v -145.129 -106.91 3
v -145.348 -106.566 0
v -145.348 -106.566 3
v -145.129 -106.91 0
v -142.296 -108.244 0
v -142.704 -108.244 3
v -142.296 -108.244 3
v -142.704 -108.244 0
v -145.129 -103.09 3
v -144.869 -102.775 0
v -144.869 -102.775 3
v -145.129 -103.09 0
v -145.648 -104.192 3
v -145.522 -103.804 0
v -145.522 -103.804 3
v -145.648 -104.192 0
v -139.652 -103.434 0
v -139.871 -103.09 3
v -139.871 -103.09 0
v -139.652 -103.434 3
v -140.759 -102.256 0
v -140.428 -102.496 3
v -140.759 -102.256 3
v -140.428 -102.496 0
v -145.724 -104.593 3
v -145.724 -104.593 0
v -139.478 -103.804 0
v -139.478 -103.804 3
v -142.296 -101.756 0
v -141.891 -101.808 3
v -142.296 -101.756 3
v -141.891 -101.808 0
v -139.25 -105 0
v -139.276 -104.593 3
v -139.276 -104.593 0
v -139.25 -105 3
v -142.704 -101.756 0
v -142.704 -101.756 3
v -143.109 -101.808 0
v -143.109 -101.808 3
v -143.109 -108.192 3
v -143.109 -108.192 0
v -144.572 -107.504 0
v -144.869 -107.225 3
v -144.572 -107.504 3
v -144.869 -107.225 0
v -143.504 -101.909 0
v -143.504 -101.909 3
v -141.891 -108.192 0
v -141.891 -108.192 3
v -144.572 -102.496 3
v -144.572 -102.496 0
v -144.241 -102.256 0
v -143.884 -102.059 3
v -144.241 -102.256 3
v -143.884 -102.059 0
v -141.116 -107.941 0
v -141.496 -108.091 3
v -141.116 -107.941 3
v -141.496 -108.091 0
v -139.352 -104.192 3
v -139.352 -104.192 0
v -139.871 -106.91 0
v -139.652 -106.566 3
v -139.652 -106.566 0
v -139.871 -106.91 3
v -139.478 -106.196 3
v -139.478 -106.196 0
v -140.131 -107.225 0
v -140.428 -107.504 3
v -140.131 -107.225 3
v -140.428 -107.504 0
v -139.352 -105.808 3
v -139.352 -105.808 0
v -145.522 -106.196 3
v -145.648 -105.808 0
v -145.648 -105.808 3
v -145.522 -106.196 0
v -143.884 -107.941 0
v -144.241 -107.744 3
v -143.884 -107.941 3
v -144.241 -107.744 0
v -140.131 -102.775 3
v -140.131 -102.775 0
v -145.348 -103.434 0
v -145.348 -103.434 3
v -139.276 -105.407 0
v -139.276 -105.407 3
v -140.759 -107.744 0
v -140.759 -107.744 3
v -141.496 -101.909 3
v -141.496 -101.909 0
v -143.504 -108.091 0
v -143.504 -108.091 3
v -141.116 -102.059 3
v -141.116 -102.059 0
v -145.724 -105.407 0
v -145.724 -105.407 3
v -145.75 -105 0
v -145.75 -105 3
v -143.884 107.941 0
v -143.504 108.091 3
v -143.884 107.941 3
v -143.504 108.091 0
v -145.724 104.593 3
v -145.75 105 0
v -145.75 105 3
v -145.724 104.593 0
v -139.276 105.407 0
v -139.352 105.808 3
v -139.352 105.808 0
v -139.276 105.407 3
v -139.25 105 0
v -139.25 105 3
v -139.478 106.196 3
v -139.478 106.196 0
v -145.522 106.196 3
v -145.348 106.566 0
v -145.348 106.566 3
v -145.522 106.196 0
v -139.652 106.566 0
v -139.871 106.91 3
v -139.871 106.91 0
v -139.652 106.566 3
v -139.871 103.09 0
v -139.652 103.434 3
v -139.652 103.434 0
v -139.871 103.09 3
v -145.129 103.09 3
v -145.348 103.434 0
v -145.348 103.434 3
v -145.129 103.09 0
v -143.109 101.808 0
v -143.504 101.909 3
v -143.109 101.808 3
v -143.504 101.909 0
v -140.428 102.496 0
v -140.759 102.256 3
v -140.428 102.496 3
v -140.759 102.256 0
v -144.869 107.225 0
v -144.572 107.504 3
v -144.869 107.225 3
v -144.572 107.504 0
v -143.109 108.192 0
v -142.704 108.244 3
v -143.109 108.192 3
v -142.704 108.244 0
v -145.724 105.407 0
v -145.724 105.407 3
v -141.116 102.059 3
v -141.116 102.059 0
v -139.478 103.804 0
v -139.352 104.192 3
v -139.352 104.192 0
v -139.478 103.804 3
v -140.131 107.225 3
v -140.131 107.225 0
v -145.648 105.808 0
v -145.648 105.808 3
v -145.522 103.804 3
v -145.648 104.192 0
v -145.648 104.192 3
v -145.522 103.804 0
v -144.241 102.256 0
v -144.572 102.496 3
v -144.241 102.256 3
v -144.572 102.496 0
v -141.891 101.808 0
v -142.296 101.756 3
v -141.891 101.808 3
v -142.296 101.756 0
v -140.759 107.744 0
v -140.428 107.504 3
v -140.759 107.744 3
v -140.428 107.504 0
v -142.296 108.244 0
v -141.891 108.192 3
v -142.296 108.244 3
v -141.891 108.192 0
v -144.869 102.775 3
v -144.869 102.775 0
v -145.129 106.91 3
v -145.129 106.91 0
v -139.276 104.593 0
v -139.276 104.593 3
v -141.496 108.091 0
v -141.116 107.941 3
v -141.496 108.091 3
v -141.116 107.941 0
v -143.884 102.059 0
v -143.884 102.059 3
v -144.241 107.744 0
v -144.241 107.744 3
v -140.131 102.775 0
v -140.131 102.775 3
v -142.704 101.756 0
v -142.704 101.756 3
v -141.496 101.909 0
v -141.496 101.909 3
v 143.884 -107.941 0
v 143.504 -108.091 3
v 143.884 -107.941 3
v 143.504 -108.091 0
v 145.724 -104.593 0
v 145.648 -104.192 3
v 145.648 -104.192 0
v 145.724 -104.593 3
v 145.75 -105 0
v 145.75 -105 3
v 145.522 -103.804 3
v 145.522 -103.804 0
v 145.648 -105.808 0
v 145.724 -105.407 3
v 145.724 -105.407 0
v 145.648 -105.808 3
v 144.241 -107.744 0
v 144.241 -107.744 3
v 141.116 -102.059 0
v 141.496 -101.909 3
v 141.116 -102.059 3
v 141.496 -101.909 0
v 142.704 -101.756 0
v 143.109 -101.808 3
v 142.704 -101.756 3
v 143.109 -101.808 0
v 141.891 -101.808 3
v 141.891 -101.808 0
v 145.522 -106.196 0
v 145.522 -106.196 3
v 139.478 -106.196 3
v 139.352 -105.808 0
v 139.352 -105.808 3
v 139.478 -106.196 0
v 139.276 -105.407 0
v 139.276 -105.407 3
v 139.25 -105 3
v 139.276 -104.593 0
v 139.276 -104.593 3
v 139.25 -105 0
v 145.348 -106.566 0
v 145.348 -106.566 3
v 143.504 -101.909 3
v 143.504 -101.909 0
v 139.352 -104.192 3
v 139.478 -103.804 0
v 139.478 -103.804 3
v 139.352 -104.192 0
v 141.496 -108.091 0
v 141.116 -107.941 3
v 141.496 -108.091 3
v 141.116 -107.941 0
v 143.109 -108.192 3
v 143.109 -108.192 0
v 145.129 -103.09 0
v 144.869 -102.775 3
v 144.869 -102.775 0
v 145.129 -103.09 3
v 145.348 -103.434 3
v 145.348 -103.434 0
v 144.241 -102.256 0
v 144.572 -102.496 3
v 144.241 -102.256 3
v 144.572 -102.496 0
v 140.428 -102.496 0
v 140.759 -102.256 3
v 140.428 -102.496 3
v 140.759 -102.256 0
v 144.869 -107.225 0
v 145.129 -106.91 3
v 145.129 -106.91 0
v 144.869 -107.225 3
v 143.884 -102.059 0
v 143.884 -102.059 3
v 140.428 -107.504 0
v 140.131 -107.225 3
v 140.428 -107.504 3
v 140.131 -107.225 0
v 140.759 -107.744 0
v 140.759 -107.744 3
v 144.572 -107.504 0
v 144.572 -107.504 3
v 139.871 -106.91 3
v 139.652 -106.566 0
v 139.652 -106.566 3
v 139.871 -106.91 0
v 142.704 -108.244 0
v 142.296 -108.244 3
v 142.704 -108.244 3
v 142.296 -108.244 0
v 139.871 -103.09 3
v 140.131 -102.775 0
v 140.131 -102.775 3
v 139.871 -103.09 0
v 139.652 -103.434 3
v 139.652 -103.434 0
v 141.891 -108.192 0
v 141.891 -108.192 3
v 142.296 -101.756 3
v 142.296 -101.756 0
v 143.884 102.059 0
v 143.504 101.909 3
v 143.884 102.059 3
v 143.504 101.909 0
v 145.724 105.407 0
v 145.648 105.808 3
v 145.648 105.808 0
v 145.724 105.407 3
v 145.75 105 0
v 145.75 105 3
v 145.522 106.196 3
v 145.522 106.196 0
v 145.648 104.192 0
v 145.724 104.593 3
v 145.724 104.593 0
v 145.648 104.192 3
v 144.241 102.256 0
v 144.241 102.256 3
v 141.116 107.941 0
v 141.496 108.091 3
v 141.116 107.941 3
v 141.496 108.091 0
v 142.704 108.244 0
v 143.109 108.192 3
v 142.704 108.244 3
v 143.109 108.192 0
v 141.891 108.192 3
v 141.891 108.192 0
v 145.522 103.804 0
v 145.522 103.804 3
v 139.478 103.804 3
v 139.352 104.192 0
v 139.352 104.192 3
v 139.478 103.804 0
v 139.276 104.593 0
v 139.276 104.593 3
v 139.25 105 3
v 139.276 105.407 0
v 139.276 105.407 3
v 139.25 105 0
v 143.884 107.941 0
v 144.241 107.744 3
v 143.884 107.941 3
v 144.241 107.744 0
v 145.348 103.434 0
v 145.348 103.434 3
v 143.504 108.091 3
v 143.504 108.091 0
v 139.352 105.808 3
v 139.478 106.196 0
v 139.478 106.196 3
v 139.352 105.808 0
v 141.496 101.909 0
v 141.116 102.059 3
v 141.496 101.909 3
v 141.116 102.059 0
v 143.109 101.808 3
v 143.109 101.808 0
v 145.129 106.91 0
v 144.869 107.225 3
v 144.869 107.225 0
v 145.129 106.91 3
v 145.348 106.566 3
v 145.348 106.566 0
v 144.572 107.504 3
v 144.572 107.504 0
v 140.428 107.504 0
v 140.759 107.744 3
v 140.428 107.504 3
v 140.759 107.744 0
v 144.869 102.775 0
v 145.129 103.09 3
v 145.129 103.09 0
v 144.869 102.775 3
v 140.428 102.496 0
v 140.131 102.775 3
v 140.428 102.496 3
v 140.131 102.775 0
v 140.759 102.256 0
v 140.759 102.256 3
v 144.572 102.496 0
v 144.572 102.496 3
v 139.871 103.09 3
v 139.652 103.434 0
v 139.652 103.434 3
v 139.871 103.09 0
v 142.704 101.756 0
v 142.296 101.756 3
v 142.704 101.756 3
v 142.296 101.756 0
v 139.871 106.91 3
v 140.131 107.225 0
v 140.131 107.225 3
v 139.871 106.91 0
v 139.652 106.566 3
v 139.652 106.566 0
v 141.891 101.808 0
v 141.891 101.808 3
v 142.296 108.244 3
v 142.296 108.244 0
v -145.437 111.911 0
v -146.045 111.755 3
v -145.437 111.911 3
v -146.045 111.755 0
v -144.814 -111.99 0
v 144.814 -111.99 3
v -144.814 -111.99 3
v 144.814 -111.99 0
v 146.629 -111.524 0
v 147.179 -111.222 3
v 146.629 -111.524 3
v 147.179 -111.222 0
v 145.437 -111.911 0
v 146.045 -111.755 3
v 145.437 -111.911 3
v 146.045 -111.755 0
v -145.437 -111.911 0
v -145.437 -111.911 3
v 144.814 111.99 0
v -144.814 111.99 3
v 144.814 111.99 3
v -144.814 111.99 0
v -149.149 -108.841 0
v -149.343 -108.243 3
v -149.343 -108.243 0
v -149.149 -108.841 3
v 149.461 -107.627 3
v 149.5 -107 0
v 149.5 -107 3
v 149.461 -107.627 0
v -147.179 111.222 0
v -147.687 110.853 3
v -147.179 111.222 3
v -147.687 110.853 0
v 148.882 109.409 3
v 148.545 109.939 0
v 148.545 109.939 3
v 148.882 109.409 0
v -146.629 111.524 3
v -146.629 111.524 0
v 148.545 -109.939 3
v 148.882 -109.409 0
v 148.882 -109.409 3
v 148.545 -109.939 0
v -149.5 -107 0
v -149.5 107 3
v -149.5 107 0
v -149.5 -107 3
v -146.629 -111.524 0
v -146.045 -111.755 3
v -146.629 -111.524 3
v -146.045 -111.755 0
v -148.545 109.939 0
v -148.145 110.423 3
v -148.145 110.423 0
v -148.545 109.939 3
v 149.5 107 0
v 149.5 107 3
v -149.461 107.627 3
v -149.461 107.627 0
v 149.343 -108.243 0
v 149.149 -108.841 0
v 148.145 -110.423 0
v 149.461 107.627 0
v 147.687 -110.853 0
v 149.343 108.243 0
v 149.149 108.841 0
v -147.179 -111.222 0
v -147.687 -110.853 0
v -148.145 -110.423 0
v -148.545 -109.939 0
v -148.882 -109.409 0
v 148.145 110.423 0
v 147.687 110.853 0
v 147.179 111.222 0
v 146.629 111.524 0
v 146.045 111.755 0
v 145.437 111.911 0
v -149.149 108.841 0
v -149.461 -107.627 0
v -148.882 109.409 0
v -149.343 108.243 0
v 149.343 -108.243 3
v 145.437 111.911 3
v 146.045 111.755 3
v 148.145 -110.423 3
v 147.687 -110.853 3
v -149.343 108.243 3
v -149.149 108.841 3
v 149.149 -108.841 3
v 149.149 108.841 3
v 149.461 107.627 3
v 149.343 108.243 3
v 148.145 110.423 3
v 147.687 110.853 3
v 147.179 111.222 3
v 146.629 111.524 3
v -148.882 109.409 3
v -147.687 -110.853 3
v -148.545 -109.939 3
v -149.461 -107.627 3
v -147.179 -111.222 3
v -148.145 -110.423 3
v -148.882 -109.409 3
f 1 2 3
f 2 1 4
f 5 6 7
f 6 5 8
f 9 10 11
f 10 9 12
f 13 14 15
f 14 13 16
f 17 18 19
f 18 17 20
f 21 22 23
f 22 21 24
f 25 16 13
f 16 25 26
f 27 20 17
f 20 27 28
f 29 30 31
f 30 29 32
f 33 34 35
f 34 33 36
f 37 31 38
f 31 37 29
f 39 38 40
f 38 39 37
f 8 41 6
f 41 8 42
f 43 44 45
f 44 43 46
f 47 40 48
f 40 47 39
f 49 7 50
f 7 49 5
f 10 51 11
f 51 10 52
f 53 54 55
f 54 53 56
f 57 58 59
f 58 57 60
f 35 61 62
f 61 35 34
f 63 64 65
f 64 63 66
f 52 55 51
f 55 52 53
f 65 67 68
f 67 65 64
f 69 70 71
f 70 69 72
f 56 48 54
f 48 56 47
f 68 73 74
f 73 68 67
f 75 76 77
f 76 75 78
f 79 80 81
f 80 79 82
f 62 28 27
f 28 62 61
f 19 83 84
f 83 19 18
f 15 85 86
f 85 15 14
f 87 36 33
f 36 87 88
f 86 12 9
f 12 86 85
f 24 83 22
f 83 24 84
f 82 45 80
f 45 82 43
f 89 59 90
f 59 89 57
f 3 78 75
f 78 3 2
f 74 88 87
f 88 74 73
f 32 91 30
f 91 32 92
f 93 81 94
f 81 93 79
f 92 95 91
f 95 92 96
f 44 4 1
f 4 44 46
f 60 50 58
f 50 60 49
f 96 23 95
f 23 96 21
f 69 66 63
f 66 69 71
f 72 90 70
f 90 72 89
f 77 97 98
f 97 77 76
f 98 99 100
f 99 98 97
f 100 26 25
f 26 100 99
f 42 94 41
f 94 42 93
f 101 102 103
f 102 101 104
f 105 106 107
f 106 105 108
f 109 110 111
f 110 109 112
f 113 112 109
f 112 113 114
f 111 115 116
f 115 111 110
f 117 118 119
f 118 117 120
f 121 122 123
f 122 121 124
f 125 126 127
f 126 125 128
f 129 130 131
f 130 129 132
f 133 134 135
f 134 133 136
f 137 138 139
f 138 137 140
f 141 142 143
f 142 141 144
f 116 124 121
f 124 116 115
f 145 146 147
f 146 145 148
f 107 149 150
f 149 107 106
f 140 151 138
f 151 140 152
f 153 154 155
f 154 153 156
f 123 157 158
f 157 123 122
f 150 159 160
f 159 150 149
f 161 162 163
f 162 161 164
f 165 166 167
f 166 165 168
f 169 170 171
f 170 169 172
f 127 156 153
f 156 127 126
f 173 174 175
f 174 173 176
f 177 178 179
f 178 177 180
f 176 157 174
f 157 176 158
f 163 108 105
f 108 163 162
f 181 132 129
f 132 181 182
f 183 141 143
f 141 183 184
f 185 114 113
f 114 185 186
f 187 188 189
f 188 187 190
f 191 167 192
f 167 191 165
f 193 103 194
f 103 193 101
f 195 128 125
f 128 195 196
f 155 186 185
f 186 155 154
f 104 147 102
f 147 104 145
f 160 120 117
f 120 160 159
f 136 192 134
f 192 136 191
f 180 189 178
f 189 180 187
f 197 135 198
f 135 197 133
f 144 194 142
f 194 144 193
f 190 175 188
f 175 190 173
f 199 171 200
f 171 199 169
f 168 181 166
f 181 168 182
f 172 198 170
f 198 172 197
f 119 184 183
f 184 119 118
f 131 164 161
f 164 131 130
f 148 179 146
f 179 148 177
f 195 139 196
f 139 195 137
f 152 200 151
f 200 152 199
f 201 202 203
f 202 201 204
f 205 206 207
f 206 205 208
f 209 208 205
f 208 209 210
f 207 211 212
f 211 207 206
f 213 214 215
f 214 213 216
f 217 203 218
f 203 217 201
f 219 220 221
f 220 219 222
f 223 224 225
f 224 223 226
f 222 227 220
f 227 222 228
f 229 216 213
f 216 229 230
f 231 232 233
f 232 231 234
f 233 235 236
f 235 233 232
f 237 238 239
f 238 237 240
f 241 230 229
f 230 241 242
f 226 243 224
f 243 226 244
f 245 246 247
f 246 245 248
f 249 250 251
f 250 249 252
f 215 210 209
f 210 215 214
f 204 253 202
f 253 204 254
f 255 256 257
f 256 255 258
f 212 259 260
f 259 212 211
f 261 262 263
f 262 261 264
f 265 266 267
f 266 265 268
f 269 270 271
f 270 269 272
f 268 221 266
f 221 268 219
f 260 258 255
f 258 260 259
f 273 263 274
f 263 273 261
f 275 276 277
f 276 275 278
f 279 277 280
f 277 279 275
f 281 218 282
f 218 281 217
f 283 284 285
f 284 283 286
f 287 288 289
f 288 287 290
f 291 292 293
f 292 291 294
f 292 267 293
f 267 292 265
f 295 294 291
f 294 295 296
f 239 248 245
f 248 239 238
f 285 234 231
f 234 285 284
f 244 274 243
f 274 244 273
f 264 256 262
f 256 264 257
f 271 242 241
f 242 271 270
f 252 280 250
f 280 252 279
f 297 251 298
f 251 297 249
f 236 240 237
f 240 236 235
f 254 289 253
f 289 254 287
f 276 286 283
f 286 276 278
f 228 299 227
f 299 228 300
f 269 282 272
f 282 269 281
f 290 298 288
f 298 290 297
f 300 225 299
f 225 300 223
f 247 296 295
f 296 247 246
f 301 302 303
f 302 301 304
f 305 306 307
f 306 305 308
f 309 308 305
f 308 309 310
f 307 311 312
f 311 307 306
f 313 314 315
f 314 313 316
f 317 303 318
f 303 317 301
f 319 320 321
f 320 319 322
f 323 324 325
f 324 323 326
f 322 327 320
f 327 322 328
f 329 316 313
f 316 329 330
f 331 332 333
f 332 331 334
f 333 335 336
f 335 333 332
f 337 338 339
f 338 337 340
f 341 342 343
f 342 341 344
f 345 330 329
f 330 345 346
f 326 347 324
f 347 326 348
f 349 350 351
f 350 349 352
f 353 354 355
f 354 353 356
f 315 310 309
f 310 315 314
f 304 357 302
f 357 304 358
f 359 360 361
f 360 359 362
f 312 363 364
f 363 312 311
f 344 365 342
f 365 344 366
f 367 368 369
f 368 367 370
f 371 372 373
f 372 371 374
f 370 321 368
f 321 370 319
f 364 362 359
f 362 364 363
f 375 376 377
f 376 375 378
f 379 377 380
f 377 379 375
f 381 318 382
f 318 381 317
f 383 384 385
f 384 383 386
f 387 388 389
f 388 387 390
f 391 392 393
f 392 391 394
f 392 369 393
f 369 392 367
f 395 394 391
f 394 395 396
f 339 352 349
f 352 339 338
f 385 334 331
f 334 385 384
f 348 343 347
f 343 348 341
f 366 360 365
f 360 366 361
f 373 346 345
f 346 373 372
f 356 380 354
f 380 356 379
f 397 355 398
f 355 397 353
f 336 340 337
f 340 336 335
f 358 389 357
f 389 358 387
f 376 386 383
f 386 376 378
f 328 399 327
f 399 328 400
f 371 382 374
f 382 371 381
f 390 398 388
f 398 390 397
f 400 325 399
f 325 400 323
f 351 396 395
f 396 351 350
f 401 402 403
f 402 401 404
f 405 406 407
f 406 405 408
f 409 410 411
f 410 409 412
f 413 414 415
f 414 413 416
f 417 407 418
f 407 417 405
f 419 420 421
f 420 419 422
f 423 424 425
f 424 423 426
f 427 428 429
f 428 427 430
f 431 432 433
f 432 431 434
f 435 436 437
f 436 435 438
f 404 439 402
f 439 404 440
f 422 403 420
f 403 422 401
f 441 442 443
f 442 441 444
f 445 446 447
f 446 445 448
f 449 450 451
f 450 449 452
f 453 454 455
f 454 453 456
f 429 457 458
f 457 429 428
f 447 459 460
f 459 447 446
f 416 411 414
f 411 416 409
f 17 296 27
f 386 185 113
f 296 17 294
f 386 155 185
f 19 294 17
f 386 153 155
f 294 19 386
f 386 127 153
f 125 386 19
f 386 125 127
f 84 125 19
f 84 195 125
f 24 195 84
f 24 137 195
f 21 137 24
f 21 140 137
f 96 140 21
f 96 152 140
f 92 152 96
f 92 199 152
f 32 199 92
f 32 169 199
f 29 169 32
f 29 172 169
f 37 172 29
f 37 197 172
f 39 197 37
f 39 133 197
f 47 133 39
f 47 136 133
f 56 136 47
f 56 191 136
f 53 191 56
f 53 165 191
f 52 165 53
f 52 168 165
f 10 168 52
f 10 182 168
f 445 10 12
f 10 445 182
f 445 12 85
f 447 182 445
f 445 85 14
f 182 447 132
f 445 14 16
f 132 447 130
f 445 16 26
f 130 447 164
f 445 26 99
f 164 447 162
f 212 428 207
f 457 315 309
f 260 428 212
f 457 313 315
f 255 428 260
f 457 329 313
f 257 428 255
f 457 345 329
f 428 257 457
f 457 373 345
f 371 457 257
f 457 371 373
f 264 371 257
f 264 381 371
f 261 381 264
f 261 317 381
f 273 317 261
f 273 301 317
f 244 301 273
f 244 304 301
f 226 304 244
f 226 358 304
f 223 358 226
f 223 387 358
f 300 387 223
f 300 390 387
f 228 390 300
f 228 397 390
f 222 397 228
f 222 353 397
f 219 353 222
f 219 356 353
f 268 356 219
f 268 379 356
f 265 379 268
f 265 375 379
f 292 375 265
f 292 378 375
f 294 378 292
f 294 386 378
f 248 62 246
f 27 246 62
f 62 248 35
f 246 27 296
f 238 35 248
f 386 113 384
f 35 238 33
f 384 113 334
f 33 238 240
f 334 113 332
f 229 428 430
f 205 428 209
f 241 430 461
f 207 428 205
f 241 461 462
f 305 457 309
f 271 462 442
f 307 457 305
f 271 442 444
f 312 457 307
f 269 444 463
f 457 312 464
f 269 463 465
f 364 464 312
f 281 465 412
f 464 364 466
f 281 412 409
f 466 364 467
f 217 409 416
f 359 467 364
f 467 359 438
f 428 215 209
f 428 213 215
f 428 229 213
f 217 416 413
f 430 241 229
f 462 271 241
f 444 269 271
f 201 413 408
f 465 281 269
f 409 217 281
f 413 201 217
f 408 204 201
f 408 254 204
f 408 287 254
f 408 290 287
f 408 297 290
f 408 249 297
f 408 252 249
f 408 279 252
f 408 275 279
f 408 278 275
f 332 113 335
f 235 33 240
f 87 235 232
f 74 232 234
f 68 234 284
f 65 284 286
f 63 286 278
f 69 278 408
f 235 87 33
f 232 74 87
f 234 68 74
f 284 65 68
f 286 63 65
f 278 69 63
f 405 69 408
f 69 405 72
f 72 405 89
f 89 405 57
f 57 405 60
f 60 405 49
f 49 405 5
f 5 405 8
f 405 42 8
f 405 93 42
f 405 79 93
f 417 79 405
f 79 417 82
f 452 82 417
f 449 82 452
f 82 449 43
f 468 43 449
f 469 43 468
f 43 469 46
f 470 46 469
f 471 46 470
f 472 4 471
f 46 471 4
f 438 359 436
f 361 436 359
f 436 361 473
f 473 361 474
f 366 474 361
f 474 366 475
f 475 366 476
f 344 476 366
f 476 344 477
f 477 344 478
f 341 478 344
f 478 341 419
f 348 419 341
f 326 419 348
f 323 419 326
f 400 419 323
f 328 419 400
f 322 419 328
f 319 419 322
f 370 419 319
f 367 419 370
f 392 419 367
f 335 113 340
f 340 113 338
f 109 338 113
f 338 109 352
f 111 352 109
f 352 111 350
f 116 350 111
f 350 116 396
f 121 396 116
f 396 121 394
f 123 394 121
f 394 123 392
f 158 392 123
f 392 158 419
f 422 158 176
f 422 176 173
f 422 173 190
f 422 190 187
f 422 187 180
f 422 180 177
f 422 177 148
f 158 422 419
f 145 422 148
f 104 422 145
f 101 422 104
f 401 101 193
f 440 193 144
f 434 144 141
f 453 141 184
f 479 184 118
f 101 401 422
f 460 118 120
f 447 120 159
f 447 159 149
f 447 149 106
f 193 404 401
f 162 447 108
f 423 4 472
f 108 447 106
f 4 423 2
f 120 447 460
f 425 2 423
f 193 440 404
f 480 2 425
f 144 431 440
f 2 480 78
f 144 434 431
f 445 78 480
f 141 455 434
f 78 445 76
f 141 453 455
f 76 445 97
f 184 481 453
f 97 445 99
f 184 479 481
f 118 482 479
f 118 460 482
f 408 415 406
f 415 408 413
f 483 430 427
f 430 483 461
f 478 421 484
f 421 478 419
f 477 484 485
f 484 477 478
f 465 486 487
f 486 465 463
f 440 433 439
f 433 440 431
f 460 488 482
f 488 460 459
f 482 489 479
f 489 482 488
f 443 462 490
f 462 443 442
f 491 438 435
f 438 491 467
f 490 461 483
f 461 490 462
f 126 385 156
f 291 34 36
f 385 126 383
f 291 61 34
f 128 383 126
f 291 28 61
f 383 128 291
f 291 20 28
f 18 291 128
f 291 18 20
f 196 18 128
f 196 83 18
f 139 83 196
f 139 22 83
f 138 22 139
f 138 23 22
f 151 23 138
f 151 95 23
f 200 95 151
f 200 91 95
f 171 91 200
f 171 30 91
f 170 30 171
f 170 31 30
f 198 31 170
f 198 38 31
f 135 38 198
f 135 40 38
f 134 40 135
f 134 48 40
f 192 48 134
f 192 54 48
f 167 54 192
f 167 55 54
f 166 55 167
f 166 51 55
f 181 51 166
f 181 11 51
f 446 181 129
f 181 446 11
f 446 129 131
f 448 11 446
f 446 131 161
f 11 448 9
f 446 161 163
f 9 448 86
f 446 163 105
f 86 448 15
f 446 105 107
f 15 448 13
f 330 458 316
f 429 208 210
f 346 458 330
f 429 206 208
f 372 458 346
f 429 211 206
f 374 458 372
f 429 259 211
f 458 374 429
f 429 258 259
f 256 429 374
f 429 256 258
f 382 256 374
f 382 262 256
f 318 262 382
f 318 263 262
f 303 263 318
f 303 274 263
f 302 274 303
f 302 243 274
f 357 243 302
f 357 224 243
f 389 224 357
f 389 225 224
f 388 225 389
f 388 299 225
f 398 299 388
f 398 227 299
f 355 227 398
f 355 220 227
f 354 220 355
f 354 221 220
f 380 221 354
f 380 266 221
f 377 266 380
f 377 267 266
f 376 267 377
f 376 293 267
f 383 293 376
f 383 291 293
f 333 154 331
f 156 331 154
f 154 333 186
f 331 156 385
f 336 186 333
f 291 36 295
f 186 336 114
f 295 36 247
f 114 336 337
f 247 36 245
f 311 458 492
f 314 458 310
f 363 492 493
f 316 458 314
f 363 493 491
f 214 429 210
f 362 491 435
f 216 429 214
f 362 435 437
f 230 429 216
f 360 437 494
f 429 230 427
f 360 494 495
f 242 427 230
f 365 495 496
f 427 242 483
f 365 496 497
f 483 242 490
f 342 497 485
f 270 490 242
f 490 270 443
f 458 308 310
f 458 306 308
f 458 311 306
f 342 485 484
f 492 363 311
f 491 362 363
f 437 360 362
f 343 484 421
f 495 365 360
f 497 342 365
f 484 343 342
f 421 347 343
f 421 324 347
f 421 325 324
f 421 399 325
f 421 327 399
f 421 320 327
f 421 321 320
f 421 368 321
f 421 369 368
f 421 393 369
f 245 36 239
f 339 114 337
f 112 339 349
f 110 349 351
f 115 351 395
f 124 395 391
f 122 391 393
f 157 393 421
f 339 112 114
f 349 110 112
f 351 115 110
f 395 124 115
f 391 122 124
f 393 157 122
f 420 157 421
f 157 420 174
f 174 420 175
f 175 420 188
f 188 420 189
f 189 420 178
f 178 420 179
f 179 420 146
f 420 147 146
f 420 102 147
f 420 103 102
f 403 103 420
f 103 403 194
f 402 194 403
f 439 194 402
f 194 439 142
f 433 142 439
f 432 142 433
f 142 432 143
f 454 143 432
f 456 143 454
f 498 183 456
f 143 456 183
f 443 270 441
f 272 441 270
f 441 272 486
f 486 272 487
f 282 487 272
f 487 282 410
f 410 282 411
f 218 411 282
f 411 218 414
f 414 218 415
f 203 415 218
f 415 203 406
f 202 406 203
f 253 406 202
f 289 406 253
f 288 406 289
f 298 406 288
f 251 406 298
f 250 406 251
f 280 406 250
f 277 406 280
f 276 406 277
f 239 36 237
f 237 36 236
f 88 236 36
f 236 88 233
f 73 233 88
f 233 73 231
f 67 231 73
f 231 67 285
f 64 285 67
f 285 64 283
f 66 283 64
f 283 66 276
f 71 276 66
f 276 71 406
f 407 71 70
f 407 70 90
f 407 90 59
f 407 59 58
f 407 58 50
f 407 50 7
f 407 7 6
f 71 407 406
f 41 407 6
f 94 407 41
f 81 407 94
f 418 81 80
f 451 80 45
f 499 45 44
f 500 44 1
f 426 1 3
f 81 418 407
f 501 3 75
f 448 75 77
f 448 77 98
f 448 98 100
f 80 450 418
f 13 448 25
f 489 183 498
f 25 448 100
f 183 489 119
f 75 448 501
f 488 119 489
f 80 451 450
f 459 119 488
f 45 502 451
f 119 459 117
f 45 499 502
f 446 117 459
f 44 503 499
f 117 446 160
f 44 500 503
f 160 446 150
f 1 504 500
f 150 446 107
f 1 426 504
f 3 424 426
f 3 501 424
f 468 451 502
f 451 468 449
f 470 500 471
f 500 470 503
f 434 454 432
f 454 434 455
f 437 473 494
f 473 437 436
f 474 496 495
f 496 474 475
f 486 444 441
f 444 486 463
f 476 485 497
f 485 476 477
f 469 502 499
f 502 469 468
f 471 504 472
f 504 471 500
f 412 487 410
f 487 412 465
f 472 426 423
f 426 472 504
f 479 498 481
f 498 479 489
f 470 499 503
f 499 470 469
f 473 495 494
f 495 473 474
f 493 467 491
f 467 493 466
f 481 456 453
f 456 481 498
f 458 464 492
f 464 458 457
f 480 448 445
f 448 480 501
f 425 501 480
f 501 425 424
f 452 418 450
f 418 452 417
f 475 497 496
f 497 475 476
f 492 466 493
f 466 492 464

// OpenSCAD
$fn = 50;


difference() {
	union() {
		hull() {
			translate(v = [-144.5000000000, 107.0000000000, 0]) {
				cylinder(h = 3, r = 5);
			}
			translate(v = [144.5000000000, 107.0000000000, 0]) {
				cylinder(h = 3, r = 5);
			}
			translate(v = [-144.5000000000, -107.0000000000, 0]) {
				cylinder(h = 3, r = 5);
			}
			translate(v = [144.5000000000, -107.0000000000, 0]) {
				cylinder(h = 3, r = 5);
			}
		}
	}
	union() {
		translate(v = [-142.5000000000, -105.0000000000, -100.0000000000]) {
			cylinder(h = 200, r = 3.2500000000);
		}
		translate(v = [-142.5000000000, 105.0000000000, -100.0000000000]) {
			cylinder(h = 200, r = 3.2500000000);
		}
		translate(v = [142.5000000000, -105.0000000000, -100.0000000000]) {
			cylinder(h = 200, r = 3.2500000000);
		}
		translate(v = [142.5000000000, 105.0000000000, -100.0000000000]) {
			cylinder(h = 200, r = 3.2500000000);
		}
	}
}
